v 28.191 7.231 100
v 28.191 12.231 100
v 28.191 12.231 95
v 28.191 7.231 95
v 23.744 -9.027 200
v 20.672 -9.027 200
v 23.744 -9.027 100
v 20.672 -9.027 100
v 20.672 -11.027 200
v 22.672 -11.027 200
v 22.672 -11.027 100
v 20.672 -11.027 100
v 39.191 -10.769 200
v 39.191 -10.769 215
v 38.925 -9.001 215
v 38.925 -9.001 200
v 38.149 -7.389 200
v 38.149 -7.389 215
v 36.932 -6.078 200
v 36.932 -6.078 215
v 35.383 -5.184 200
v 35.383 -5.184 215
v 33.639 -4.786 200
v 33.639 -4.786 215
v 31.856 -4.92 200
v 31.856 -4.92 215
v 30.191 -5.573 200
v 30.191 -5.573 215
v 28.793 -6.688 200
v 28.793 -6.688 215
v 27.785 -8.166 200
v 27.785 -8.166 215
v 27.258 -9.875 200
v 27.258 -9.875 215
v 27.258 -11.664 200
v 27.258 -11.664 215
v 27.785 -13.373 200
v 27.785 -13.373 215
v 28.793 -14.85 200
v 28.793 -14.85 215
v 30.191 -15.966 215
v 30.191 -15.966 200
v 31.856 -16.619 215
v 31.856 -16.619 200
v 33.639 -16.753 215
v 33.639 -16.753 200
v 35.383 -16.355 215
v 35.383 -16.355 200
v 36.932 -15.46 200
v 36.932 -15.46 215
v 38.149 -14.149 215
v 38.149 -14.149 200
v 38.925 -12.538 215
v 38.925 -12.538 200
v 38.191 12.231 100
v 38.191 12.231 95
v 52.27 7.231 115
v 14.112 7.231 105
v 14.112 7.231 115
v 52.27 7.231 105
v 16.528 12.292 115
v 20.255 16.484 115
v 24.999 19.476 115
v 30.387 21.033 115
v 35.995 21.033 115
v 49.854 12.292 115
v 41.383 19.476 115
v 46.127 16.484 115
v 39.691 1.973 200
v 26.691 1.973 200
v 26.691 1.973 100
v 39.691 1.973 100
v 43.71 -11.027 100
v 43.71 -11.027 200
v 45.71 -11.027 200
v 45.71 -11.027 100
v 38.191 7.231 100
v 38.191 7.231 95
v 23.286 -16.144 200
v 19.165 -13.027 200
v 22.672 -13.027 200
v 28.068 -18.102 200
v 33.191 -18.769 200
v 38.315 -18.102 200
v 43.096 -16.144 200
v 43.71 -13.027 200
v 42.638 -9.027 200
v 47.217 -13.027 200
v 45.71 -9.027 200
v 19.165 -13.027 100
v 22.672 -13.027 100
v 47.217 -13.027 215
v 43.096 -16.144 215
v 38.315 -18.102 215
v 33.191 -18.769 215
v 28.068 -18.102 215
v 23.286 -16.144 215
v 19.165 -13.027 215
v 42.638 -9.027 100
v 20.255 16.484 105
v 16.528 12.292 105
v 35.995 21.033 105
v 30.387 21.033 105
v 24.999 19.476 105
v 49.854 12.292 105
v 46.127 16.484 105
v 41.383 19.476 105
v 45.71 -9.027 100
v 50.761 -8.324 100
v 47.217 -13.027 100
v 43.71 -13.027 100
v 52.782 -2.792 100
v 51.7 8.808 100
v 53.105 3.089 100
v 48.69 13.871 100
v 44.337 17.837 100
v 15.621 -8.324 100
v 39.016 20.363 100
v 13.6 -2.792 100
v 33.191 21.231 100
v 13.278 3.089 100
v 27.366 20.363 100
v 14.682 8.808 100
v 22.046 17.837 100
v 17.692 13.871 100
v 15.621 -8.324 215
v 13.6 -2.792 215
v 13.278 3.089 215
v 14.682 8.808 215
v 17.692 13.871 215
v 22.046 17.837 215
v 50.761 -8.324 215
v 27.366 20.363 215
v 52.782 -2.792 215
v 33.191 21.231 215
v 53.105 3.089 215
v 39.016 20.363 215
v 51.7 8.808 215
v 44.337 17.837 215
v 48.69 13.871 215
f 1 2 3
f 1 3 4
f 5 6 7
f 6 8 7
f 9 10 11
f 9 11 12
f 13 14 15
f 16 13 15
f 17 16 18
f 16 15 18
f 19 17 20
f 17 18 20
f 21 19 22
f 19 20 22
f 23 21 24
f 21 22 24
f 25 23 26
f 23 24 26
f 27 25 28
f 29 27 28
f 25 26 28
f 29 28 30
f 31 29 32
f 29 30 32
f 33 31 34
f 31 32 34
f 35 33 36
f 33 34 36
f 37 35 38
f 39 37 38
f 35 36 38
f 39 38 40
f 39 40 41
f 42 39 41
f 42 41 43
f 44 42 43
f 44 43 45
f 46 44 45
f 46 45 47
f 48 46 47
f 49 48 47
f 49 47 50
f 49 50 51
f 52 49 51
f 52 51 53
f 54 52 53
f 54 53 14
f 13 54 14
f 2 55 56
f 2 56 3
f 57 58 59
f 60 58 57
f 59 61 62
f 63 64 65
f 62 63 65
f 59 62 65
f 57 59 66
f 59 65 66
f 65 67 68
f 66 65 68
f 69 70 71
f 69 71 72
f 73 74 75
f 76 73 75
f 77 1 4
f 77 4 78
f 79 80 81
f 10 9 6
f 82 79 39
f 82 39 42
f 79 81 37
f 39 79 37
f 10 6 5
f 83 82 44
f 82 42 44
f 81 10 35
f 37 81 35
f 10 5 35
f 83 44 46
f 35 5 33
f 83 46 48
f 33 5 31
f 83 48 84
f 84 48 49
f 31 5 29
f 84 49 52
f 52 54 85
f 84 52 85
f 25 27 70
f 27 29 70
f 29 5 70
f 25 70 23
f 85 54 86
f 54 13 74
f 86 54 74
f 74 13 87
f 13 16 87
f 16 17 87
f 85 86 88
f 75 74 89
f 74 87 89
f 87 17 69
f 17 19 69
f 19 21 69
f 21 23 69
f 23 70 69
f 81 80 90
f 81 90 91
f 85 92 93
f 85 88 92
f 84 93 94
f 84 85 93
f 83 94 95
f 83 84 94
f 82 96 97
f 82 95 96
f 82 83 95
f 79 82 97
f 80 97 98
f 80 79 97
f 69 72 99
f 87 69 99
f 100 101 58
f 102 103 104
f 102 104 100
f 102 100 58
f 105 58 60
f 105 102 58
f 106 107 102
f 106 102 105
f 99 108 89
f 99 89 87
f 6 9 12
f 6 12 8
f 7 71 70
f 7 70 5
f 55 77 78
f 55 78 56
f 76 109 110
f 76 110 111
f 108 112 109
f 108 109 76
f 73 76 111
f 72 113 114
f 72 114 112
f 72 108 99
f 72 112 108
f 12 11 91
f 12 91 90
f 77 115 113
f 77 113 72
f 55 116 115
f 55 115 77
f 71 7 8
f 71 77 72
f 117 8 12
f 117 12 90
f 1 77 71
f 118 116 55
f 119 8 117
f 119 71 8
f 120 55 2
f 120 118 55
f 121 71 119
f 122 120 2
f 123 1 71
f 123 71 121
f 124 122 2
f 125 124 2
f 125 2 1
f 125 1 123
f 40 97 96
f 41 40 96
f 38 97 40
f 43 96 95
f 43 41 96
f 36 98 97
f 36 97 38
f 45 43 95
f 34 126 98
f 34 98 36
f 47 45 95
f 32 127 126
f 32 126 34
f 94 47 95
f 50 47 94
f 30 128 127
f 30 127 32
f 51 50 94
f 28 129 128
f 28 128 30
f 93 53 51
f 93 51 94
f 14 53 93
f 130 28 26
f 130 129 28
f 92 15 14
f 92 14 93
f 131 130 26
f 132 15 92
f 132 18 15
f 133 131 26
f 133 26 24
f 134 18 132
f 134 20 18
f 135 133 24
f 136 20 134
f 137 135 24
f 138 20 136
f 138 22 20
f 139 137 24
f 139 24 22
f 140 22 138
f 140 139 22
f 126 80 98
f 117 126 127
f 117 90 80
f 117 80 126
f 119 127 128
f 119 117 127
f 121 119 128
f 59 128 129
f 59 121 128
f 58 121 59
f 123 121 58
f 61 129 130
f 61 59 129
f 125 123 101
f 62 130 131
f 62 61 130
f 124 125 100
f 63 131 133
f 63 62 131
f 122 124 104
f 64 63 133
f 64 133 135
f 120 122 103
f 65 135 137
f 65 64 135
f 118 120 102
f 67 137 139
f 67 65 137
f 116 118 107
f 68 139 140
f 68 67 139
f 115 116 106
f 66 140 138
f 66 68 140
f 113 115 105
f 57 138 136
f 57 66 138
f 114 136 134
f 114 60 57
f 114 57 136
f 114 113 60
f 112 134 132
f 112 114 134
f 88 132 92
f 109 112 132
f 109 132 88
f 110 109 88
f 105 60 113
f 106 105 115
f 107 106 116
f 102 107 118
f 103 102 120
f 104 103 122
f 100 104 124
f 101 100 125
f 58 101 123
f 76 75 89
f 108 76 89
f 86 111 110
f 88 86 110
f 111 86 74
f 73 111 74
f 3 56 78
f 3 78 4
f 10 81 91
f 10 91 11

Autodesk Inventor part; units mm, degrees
ref_plane "YZ Plane" through (0, 0, 0) normal (1, 0, 0) x (0, 1, 0)
ref_plane "XZ Plane" through (0, 0, 0) normal (0, 1, 0) x (-1, 0, 0)
ref_plane "XY Plane" through (0, 0, 0) normal (0, 0, 1) x (1, 0, 0)
sketch "Эскиз1" plane through (0, 0, 0) normal (0, 0, 1) x (1, 0, 0)
  arc A0 (47.2167, -13.0271) -> (19.1654, -13.0271) centre (33.1911, 1.2306) ccw
  line L0 (26.6911, 1.9729) -> (39.6911, 1.9729)
  line L1 (39.6911, 1.9729) -> (42.6385, -9.0271)
  line L2 (33.1911, 1.9729) -> (33.1911, -13.0271) construction
  line L3 (26.6911, 1.9729) -> (23.7436, -9.0271)
  line L4 (22.6718, -13.0271) -> (22.6718, -11.0271)
  line L5 (22.6718, -11.0271) -> (20.6718, -11.0271)
  line L6 (20.6718, -11.0271) -> (20.6718, -9.0271)
  line L7 (20.6718, -9.0271) -> (23.7436, -9.0271)
  line L8 (43.7103, -13.0271) -> (43.7103, -11.0271)
  line L9 (43.7103, -11.0271) -> (45.7103, -11.0271)
  line L10 (45.7103, -11.0271) -> (45.7103, -9.0271)
  line L11 (45.7103, -9.0271) -> (42.6385, -9.0271)
  line L12 (19.1654, -13.0271) -> (22.6718, -13.0271)
  line L13 (43.7103, -13.0271) -> (47.2167, -13.0271)
  point P0 (19.1654, -13.0271)
  dimension "d3" = 13
  dimension "d4" = 105
  dimension "d5" = 15
  dimension "d6" = 40
  dimension "d44" = 2
  dimension "d45" = 2
  dimension "d46" = 2
  dimension "d47" = 3.5064
extrude "Выдавливание1" add sketch "Эскиз1" along normal blind 200
ref_plane "РабПлоскость2" through (0, 0, 105) normal (0, 0, 1) x (1, 0, 0)
ref_plane "РабПлоскость1" through (0, 0, 100) normal (0, 0, 1) x (1, 0, 0)
sketch "Эскиз3" plane through (0, 0, 200) normal (0, 0, 1) x (1, 0, 0)
  arc A0 (47.2167, -13.0271) -> (19.1654, -13.0271) centre (33.1911, 1.2306) ccw projected
  circle A1 centre (33.1911, 1.2306) radius 20
  point P0 (0, 0)
  point P1 (19.1654, -13.0271)
extrude "Выдавливание3" add sketch "Эскиз3" along normal blind 15
sketch "Эскиз5" plane through (33.1911, 1.2306, 215) normal (0, 0, 1) x (1, 0, 0)
  circle A0 centre (0, -12) radius 6
  circle A1 centre (0, 0) radius 20 construction
  circle A2 centre (0, 0) radius 18 construction
  circle A3 centre (0, 0) radius 20 construction
  line L0 (0, -20) -> (0, 0)
  point P0 (-33.1911, -1.2306)
  dimension "d38" = 12
  dimension "d39" = 2
extrude "Выдавливание5" cut sketch "Эскиз5" against normal blind 15
sketch "Эскиз13" plane through (0, 0, 105) normal (0, 0, 1) x (1, 0, 0)
  circle A0 centre (33.1911, 1.2306) radius 20 projected
  circle A1 centre (33.1911, 1.2306) radius 20
  line L0 (14.1123, 7.2306) -> (52.2699, 7.2306)
  point P0 (0, 0)
  dimension "d79" = 6
extrude "Выдавливание12" cut sketch "Эскиз13" along normal blind 10 contours L0 A0 picked at (30.9346, 14.3004)
sketch "Эскиз14" plane through (0, 0, 0) normal (0, 0, -1) x (-1, 0, 0)
  arc A0 (-14.1123, 7.2306) -> (-52.2699, 7.2306) centre (-33.1911, 1.2306) ccw projected
  circle A1 centre (-33.1911, 1.2306) radius 20
  point P0 (0, 0)
  point P1 (-52.2699, 7.2306)
extrude "Выдавливание13" cut sketch "Эскиз14" against normal up to surface (100 mm away)
sketch "Эскиз15" plane through (33.1911, 1.2306, 100) normal (0, 0, -1) x (-1, 0, 0)
  line L0 (-5, 11) -> (5, 11)
  line L1 (5, 11) -> (5, 6)
  line L2 (5, 6) -> (-5, 6)
  line L3 (-5, 6) -> (-5, 11)
  arc A0 (19.0788, 6) -> (-19.0788, 6) centre (0, 0) ccw projected
  line L4 (0, 0) -> (0, 22.3404)
  point P0 (33.1911, -1.2306)
  point P1 (0, 11)
  dimension "d84" = 10
  dimension "d85" = 5
  dimension "d86" = 6
extrude "Выдавливание14" add sketch "Эскиз15" along normal blind 5
properties part number "lamp2"
